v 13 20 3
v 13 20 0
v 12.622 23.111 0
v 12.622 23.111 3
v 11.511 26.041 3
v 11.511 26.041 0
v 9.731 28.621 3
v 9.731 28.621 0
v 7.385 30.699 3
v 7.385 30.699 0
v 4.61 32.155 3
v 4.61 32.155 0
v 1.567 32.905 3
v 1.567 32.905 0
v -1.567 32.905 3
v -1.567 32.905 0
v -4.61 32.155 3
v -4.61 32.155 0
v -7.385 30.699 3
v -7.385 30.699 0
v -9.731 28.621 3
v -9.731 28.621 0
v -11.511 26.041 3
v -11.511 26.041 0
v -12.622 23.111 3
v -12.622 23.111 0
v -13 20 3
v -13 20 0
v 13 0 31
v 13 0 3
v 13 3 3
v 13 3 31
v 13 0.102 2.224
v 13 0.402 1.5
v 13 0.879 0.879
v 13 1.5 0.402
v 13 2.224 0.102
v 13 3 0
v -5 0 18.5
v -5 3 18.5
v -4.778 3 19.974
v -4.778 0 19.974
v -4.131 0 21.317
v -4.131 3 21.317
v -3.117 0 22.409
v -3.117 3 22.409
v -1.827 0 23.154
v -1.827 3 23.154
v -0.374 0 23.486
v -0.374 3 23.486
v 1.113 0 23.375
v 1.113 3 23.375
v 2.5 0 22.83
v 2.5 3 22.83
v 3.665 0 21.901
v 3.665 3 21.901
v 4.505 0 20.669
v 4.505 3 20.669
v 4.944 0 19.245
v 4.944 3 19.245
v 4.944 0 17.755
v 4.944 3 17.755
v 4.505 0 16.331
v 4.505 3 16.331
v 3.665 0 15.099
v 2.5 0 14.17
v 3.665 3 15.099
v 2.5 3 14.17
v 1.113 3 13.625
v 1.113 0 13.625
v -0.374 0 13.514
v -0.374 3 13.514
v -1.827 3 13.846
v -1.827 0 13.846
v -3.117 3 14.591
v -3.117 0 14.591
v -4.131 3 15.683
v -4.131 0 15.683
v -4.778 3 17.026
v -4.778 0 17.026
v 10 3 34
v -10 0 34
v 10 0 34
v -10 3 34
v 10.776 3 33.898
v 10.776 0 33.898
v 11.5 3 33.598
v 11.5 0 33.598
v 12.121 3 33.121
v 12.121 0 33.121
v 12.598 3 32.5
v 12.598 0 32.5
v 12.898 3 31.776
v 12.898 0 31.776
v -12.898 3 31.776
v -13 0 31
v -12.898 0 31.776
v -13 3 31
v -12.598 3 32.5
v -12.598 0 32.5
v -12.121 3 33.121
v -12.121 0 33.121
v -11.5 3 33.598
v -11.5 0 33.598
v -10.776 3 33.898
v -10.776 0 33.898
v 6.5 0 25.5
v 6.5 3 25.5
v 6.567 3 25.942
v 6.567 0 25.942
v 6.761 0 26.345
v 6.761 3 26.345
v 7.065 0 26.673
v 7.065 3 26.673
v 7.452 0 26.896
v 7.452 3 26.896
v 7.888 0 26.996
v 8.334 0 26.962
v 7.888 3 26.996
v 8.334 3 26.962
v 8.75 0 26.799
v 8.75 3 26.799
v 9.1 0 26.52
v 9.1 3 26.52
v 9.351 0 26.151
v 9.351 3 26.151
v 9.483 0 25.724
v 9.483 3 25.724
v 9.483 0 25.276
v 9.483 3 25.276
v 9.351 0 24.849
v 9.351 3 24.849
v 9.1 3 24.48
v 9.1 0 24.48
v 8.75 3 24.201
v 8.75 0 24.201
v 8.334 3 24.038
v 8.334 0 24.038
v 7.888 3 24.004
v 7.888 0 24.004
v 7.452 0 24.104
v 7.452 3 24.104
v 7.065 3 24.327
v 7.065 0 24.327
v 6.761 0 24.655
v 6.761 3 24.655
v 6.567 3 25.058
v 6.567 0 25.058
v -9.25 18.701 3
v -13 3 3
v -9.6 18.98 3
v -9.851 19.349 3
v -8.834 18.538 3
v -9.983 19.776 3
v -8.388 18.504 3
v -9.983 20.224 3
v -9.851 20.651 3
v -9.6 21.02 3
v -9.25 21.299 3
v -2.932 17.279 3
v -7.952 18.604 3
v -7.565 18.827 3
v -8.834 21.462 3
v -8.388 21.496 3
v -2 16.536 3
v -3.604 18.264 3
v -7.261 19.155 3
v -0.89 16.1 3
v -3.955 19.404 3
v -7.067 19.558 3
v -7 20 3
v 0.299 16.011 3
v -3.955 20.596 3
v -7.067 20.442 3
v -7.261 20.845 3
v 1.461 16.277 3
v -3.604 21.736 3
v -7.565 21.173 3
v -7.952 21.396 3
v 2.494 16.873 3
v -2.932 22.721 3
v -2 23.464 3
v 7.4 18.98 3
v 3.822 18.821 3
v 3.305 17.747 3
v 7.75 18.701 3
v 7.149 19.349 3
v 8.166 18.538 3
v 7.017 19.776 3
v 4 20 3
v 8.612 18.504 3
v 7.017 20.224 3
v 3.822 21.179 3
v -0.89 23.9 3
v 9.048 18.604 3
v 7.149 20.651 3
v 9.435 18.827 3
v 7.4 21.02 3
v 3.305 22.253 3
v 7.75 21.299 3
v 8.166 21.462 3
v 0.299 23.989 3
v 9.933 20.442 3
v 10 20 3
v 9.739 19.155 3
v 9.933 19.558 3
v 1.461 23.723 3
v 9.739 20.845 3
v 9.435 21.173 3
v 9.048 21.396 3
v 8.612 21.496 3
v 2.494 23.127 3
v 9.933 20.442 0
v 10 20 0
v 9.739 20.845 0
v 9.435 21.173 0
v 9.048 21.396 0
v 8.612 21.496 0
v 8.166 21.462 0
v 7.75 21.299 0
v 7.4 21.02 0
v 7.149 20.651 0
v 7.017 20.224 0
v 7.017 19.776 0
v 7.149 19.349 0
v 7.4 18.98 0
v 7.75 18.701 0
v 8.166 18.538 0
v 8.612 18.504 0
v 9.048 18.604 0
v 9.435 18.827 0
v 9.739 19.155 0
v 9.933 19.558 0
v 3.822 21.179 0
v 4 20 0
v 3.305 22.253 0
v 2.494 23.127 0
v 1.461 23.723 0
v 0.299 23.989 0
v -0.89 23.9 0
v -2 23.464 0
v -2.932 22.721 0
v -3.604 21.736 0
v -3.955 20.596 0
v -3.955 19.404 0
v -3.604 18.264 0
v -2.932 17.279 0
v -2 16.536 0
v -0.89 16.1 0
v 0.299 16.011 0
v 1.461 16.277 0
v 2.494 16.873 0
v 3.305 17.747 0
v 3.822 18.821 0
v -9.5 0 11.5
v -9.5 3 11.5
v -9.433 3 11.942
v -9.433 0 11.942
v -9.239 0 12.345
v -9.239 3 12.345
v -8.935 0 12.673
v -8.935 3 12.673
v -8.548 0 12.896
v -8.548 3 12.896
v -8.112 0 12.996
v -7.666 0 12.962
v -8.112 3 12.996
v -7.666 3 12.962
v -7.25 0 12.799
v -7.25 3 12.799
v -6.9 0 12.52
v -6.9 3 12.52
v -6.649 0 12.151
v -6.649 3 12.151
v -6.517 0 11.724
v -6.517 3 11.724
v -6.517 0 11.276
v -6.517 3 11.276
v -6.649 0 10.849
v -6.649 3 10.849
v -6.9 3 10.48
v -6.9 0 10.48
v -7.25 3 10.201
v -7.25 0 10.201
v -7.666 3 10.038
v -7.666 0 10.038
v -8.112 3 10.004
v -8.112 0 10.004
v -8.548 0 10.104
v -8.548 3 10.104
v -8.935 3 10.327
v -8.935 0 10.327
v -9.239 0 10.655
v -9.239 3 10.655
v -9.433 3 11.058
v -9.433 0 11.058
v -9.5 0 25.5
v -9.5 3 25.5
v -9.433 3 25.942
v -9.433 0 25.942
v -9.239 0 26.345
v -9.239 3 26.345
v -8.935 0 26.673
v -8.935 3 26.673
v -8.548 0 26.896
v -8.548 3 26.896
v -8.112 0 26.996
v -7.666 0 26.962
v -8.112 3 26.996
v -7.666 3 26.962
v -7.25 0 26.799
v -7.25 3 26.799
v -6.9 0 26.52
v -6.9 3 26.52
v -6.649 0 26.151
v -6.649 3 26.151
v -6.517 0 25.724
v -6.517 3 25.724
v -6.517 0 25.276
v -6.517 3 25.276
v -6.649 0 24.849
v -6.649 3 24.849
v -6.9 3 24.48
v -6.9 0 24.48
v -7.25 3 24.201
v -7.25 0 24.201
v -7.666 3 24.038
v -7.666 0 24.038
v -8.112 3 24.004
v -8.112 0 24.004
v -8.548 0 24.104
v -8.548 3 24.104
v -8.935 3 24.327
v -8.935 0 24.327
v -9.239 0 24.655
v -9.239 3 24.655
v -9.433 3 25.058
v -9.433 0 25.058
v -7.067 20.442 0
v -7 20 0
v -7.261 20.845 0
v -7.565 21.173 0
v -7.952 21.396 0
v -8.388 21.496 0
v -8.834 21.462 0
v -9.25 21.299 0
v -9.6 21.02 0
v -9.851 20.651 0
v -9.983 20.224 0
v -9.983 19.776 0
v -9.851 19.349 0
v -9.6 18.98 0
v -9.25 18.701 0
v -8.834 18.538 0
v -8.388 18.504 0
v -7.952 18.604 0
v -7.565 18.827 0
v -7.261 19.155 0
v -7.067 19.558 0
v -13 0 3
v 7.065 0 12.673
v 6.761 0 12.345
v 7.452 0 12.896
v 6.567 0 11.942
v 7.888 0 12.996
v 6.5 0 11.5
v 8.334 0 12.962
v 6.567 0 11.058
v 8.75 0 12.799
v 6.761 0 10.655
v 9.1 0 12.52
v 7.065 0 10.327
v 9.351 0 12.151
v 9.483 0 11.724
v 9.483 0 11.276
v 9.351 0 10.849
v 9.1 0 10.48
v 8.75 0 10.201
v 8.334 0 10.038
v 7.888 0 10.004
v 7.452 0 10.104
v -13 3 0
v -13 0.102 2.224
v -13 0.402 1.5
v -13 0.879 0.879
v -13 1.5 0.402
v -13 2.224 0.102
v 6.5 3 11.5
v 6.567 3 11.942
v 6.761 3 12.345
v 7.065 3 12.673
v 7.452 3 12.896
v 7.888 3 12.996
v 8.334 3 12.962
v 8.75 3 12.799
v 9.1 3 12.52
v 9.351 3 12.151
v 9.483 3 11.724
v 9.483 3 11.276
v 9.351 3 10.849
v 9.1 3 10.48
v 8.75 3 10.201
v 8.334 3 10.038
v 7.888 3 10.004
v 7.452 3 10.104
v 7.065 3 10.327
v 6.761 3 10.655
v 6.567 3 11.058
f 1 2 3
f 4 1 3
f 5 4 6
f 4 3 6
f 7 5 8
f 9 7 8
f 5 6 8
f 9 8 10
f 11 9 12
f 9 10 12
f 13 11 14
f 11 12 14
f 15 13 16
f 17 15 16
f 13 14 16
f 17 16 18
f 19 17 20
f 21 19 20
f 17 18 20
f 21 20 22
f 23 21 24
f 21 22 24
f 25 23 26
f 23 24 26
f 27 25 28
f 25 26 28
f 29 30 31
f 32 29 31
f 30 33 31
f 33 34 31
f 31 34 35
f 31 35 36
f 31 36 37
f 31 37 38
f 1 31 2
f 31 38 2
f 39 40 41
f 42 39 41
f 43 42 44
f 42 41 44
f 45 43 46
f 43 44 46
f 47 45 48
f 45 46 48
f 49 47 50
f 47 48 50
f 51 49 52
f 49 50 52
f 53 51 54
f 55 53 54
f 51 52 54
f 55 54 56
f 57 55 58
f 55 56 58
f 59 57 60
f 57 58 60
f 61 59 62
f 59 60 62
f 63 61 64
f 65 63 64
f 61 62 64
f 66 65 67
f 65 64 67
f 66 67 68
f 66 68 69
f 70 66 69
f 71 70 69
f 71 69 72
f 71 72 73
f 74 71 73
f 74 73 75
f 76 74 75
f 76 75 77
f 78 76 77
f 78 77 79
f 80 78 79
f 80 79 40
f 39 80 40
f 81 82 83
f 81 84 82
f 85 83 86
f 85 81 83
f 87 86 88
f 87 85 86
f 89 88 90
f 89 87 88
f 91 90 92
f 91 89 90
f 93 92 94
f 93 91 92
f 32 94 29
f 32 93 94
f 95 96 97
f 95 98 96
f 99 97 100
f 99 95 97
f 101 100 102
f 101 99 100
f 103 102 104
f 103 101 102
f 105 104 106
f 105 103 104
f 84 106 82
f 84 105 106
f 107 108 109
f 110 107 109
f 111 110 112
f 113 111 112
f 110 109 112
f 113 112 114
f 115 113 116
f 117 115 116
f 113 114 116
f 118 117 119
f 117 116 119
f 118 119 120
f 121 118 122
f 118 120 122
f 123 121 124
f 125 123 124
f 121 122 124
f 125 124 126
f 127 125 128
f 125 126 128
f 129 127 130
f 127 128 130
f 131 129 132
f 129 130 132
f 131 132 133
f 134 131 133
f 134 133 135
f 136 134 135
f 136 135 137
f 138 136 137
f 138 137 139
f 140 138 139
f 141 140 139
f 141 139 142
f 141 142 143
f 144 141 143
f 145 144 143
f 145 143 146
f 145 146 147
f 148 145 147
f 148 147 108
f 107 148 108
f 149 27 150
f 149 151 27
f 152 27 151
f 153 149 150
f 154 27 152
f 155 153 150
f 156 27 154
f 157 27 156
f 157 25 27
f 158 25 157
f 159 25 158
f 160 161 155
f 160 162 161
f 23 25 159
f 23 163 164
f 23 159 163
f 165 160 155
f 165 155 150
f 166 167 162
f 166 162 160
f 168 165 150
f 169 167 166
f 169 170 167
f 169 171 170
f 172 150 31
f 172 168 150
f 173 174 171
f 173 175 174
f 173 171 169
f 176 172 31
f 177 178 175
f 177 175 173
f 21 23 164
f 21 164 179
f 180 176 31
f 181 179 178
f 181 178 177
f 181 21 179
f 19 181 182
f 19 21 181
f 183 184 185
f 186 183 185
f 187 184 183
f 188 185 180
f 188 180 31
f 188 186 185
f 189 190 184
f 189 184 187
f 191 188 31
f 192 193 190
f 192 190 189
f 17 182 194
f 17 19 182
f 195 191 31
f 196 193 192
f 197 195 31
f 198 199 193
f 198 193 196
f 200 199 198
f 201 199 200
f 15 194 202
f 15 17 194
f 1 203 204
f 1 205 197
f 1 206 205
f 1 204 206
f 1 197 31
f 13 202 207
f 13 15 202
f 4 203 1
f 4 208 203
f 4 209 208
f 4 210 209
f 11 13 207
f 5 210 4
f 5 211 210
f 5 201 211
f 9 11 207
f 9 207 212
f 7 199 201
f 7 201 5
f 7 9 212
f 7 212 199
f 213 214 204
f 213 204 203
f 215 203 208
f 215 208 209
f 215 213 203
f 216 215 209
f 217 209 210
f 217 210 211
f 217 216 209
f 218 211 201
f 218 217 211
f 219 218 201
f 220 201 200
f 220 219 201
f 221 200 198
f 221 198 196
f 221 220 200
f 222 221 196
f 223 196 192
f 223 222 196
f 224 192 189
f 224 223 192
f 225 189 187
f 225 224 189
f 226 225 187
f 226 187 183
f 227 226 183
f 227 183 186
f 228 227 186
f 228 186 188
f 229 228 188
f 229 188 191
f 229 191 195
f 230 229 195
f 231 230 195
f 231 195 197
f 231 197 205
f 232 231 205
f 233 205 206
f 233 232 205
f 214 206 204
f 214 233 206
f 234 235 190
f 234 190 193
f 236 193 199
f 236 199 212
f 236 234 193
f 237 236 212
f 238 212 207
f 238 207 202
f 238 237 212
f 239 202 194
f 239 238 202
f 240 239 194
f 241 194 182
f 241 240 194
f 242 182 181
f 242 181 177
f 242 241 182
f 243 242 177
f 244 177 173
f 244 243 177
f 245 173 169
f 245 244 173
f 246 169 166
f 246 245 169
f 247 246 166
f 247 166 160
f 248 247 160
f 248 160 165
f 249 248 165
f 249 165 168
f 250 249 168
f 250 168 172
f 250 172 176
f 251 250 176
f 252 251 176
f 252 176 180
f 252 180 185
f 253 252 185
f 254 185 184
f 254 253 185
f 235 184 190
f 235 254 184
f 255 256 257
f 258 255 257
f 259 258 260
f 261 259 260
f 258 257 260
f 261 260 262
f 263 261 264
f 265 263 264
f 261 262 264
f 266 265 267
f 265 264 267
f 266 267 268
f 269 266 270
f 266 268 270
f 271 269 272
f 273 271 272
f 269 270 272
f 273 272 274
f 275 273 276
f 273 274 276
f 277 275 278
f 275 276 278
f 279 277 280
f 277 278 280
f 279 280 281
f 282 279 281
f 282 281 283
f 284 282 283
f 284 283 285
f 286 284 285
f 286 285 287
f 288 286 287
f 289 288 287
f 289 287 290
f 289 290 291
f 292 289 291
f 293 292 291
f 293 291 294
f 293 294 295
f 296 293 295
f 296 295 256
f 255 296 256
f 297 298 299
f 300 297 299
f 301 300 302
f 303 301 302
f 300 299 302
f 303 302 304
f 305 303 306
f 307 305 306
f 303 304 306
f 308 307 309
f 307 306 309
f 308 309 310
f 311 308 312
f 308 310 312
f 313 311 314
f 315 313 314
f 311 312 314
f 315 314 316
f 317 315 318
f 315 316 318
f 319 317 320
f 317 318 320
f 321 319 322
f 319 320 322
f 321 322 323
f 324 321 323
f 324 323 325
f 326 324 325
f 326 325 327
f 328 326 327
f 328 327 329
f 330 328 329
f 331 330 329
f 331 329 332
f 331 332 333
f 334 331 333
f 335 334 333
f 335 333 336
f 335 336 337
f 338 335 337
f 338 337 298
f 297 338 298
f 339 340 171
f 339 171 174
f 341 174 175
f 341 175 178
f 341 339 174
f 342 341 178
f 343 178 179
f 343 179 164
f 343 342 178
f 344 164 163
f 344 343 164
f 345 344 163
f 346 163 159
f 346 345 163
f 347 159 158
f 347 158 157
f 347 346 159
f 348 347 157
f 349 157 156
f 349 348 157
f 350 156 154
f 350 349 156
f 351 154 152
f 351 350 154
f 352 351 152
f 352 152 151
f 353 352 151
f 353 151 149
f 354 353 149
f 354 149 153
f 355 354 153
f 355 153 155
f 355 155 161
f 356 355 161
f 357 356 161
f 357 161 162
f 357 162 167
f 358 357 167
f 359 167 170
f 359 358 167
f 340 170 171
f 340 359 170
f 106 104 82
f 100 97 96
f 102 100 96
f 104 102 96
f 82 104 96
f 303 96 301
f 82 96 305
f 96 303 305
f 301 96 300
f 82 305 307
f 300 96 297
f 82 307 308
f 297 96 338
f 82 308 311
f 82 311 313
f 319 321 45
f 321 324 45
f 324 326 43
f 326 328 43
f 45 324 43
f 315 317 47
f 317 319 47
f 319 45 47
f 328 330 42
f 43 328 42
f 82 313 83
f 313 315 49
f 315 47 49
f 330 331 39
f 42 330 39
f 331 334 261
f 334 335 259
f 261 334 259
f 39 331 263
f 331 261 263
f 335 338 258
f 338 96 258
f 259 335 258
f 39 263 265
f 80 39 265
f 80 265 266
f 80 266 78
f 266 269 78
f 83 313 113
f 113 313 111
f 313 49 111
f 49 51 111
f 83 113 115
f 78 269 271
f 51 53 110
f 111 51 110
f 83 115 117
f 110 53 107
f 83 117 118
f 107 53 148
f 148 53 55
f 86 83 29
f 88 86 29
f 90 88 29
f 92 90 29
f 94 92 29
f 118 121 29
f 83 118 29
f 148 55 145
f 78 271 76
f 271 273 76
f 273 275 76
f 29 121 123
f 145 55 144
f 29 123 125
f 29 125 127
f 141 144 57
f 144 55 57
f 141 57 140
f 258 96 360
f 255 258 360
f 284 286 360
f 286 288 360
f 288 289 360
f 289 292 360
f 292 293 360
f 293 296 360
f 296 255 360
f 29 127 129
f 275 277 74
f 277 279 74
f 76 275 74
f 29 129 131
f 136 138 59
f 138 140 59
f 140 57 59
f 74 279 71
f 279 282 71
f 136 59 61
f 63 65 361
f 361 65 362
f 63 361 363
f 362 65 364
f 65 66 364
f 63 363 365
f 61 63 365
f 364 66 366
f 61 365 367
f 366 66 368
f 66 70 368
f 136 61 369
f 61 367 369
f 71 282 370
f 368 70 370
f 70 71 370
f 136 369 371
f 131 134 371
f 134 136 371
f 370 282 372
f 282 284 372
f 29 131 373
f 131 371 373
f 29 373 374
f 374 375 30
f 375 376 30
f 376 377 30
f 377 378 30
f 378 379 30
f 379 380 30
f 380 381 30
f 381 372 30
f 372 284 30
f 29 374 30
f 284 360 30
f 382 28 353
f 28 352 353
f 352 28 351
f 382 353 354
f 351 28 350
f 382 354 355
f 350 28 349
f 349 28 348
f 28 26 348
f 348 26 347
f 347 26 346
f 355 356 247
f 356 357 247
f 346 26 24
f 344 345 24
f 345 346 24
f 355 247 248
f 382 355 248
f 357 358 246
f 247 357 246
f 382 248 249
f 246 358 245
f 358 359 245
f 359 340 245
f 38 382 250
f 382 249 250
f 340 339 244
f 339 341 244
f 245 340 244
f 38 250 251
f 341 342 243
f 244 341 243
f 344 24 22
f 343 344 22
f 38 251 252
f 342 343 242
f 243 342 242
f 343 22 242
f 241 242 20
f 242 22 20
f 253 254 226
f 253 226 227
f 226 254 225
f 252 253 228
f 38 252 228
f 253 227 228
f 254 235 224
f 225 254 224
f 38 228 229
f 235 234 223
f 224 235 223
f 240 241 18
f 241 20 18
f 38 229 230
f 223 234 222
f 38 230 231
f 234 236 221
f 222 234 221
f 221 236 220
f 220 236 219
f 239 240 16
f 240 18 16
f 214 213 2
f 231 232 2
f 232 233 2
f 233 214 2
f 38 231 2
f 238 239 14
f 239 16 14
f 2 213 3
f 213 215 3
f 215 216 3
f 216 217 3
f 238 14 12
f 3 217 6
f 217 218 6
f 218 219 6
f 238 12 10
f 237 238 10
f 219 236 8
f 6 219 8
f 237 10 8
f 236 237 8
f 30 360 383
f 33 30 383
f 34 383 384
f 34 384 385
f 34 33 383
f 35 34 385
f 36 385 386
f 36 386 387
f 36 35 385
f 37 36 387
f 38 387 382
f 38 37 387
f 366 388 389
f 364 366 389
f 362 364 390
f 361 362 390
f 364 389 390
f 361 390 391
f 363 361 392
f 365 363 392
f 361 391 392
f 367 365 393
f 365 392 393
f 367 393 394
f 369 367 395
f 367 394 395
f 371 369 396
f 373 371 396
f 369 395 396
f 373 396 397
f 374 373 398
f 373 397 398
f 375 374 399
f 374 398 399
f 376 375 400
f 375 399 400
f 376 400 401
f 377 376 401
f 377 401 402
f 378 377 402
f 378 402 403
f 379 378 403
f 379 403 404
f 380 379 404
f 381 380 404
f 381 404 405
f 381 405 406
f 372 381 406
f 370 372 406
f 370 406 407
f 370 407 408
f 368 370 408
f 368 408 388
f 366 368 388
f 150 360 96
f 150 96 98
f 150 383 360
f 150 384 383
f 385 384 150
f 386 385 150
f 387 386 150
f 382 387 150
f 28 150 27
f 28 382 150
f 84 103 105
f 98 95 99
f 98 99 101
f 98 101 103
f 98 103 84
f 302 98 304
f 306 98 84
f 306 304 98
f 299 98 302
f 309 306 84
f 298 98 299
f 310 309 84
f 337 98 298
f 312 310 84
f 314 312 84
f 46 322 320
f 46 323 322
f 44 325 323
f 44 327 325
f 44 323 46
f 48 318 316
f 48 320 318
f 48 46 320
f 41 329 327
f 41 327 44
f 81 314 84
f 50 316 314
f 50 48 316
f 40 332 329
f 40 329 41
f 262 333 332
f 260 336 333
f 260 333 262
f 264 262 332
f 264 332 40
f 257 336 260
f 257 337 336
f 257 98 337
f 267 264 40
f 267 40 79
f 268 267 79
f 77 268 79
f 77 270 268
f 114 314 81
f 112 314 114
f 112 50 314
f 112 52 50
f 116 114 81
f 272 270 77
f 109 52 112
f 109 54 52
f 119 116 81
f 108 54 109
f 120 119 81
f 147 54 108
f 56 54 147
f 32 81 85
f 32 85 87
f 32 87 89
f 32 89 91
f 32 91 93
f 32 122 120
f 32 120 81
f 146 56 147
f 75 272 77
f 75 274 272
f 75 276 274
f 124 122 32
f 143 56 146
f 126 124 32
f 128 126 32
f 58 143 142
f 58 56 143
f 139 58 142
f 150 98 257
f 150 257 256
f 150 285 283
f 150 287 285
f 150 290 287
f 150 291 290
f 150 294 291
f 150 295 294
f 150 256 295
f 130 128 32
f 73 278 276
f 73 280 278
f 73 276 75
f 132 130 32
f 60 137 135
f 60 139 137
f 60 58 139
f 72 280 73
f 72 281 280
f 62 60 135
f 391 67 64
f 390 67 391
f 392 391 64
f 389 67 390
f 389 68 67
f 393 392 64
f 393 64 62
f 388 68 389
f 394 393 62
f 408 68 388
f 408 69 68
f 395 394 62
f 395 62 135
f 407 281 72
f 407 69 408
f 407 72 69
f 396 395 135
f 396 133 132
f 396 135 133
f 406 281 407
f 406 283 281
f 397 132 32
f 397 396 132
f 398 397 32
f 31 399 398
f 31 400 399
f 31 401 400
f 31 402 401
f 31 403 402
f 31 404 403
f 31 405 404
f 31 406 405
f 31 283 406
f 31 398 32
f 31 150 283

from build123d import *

# Parameters (mm, degrees)
SKETCH2_R           = 4
SKETCH2_R_2         = 1.5
BOSS_EXTRUDE1_DEPTH = 3
SKETCH3_W           = 26
SKETCH3_H           = 3
BOSS_EXTRUDE2_DEPTH = 31
SKETCH4_R           = 5
SKETCH4_R_2         = 1.5
CUT_EXTRUDE1_DEPTH  = 48.16990566
FILLET1_R           = 3
FILLET2_R           = 3


with BuildPart() as part:
    # Sketch2 → Boss-Extrude1 (new body)
    with BuildSketch(Plane.XY):
        with BuildLine():
            Line((-13, 0), (13, 0))
            Line((13, 0), (13, 20))
            ThreePointArc((13, 20), (0, 33), (-13, 20))
            Line((-13, 20), (-13, 0))
        make_face()
        with Locations((0, 20)):
            Circle(SKETCH2_R, mode=Mode.SUBTRACT)
        with Locations((-8.5, 20)):
            Circle(SKETCH2_R_2, mode=Mode.SUBTRACT)
        with Locations((8.5, 20)):
            Circle(SKETCH2_R_2, mode=Mode.SUBTRACT)
    extrude(amount=BOSS_EXTRUDE1_DEPTH)

    # Sketch3 → Boss-Extrude2 (add)
    with BuildSketch(Plane.XY.offset(3)):
        with Locations((0, 1.5)):
            Rectangle(SKETCH3_W, SKETCH3_H)
    extrude(amount=BOSS_EXTRUDE2_DEPTH)

    # Sketch4 → Cut-Extrude1 (cut, through all)
    with BuildSketch(Plane(origin=(0, 3, 0), x_dir=(1, 0, 0), z_dir=(0, 1, 0))):
        with Locations(Location((0, -18.5, 0), (0, 0, 180))):
            Circle(SKETCH4_R)
        with Locations(Location((-8, -11.5, 0), (0, 0, 180))):
            Circle(SKETCH4_R_2)
        with Locations(Location((8, -11.5, 0), (0, 0, 180))):
            Circle(SKETCH4_R_2)
        with Locations(Location((8, -25.5, 0), (0, 0, 180))):
            Circle(SKETCH4_R_2)
        with Locations(Location((-8, -25.5, 0), (0, 0, 180))):
            Circle(SKETCH4_R_2)
    extrude(amount=-CUT_EXTRUDE1_DEPTH, mode=Mode.SUBTRACT)

    # Fillet1
    fillet1_edges = [part.edges().sort_by_distance(p)[0] for p in [
        (-13, 1.5, 34),
        (13, 1.5, 34),
    ]]
    fillet(fillet1_edges, radius=FILLET1_R)

    # Fillet2
    fillet2_edges = [part.edges().sort_by_distance(p)[0] for p in [
        (0, 0, 0),
    ]]
    fillet(fillet2_edges, radius=FILLET2_R)


solid = part.part
